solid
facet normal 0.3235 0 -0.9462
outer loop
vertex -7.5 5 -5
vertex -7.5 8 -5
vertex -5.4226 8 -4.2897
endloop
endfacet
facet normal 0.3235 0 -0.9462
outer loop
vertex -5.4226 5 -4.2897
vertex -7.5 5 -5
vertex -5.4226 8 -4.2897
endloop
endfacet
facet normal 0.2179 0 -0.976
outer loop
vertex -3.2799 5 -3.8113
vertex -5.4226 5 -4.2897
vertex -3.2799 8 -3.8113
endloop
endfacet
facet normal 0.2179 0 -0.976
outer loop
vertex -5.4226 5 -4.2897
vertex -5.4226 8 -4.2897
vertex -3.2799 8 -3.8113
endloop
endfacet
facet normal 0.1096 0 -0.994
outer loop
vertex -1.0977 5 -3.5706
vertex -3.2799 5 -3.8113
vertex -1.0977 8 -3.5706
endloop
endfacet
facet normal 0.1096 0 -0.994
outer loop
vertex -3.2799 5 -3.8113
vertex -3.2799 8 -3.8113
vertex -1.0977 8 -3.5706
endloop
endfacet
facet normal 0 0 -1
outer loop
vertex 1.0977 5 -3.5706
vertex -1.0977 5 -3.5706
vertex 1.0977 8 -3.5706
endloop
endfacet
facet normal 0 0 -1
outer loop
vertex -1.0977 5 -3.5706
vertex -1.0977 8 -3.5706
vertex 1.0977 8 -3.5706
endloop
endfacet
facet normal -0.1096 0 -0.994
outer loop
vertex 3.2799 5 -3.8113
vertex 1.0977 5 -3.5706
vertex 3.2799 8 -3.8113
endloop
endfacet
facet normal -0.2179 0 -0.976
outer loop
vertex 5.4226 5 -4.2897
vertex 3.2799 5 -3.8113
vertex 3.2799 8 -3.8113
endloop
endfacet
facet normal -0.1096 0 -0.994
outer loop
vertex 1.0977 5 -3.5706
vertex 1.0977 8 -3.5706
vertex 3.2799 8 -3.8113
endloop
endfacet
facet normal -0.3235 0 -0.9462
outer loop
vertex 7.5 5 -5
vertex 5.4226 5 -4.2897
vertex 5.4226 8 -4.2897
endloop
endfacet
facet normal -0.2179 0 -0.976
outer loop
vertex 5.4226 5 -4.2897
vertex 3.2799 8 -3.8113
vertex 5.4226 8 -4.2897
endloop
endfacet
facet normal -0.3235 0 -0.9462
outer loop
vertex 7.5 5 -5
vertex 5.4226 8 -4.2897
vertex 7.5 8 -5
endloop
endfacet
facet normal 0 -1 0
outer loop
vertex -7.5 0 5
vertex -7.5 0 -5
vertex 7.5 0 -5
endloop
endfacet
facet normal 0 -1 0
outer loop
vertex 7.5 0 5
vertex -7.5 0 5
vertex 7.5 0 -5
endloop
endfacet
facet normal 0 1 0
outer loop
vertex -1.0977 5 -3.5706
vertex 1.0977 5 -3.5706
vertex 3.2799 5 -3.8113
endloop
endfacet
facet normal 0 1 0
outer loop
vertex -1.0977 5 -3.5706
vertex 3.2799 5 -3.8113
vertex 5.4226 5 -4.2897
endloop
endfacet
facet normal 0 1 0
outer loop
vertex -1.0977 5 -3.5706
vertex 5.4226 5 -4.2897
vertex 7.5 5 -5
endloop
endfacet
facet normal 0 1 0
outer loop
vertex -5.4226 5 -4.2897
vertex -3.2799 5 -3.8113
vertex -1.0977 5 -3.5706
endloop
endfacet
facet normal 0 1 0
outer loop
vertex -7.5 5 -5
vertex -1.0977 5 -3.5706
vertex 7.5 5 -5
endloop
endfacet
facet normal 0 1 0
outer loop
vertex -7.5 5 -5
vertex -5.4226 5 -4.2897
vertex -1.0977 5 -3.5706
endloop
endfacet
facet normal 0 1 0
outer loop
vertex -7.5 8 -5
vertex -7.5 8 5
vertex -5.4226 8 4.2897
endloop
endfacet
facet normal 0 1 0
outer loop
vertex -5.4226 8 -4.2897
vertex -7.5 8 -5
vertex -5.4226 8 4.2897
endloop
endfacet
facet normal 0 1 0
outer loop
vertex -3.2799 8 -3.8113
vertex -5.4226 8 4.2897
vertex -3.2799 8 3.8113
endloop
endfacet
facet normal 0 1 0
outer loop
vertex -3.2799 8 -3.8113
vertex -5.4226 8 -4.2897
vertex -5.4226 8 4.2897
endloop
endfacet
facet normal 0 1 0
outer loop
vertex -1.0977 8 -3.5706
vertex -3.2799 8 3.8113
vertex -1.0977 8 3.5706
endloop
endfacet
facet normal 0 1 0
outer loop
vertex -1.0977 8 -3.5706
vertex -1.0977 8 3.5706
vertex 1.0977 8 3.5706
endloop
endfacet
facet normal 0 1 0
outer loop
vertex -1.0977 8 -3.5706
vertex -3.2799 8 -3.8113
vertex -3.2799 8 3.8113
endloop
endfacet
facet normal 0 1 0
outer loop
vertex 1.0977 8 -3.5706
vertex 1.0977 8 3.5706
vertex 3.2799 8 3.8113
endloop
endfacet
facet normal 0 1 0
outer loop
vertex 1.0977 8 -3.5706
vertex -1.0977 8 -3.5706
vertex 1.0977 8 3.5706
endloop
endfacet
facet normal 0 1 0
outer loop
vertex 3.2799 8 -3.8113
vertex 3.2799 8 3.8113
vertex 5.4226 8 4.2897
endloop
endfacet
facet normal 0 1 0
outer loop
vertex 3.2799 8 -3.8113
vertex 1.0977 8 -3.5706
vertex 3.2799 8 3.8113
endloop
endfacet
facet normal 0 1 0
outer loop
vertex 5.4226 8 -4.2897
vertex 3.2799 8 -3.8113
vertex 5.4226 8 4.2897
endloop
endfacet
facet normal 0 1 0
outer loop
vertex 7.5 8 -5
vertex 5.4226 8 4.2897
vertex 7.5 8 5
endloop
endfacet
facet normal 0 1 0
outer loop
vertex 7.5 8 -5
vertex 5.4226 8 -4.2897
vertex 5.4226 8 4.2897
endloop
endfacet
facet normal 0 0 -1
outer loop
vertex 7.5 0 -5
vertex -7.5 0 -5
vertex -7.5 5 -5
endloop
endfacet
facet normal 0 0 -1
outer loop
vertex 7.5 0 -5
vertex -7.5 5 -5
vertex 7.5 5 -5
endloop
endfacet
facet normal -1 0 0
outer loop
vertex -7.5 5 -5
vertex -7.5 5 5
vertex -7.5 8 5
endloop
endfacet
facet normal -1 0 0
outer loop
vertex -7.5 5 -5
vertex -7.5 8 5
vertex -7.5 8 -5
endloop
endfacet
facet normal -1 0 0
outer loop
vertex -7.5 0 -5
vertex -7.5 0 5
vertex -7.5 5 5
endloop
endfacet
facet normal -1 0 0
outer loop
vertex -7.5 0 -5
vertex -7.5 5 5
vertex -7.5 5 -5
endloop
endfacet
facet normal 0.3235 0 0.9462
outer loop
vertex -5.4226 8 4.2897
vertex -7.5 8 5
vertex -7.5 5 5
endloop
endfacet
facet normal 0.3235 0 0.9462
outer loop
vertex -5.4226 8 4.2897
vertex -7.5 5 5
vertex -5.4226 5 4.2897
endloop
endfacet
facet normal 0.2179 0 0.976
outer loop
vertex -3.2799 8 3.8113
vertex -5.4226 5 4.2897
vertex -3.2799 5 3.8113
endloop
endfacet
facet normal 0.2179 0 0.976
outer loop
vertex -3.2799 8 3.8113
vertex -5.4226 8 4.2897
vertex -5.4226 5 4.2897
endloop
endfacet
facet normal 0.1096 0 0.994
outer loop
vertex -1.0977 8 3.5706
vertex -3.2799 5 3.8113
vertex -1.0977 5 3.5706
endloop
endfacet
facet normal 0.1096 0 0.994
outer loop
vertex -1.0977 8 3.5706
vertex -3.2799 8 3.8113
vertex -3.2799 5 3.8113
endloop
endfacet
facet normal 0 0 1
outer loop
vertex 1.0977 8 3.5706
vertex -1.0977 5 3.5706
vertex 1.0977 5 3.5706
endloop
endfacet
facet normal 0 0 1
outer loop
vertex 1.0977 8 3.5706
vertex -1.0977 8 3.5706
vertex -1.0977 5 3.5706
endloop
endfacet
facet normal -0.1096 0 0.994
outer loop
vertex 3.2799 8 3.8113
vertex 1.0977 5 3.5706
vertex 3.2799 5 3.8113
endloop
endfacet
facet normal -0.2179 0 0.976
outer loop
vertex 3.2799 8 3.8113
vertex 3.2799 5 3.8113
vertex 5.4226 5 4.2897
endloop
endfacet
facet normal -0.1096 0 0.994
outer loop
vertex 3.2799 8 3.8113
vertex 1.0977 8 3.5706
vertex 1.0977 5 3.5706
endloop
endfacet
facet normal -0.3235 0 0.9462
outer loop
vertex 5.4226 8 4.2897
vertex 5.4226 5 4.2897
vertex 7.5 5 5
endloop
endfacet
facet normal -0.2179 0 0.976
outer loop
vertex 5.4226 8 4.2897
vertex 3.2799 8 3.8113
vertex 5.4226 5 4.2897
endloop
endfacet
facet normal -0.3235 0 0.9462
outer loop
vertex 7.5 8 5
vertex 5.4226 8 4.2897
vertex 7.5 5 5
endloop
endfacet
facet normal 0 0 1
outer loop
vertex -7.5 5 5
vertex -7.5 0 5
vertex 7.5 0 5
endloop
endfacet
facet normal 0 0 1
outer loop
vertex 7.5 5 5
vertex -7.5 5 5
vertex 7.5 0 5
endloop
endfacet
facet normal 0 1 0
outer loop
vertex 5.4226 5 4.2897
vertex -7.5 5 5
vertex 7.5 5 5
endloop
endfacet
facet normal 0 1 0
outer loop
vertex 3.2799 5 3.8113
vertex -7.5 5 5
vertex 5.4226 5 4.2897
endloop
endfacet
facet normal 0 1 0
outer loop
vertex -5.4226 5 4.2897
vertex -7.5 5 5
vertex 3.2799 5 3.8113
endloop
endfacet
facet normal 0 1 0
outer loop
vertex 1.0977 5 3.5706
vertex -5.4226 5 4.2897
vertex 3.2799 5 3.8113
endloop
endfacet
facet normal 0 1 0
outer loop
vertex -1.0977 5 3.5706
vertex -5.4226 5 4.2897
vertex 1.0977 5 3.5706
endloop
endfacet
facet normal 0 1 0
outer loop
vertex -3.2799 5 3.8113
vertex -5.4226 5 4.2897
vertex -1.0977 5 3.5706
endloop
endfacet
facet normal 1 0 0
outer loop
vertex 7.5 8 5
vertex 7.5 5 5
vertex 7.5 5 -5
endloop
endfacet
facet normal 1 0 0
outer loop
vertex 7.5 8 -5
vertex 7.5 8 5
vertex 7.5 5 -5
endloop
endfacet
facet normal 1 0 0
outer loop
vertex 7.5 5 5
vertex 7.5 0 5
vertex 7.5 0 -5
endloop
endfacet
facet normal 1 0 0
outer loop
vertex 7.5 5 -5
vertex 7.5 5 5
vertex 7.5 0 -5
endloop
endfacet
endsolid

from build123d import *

# Parameters (mm, degrees)
CROQUIS1_W              = 15
CROQUIS1_H              = 10
SALIENTE_EXTRUIR1_DEPTH = 8
CORTAR_EXTRUIR1_DEPTH   = 3


with BuildPart() as part:
    # Croquis1 → Saliente-Extruir1 (new body)
    with BuildSketch(Plane(origin=(0, 0, 0), x_dir=(1, 0, 0), z_dir=(0, 1, 0))):
        Rectangle(CROQUIS1_W, CROQUIS1_H)
    extrude(amount=SALIENTE_EXTRUIR1_DEPTH)

    # Croquis2 → Cortar-Extruir1 (cut)
    with BuildSketch(Plane(origin=(0, 8, 0), x_dir=(-1, 0, 0), z_dir=(0, 1, 0))):
        with BuildLine():
            Line((-7.5, -5), (7.5, -5))
            ThreePointArc((7.5, -5), (0, -3.540496218), (-7.5, -5))
        make_face()
        with BuildLine():
            ThreePointArc((-7.5, 5), (0, 3.540496218), (7.5, 5))
            Line((7.5, 5), (-7.5, 5))
        make_face()
    extrude(amount=-CORTAR_EXTRUIR1_DEPTH, mode=Mode.SUBTRACT)


solid = part.part
